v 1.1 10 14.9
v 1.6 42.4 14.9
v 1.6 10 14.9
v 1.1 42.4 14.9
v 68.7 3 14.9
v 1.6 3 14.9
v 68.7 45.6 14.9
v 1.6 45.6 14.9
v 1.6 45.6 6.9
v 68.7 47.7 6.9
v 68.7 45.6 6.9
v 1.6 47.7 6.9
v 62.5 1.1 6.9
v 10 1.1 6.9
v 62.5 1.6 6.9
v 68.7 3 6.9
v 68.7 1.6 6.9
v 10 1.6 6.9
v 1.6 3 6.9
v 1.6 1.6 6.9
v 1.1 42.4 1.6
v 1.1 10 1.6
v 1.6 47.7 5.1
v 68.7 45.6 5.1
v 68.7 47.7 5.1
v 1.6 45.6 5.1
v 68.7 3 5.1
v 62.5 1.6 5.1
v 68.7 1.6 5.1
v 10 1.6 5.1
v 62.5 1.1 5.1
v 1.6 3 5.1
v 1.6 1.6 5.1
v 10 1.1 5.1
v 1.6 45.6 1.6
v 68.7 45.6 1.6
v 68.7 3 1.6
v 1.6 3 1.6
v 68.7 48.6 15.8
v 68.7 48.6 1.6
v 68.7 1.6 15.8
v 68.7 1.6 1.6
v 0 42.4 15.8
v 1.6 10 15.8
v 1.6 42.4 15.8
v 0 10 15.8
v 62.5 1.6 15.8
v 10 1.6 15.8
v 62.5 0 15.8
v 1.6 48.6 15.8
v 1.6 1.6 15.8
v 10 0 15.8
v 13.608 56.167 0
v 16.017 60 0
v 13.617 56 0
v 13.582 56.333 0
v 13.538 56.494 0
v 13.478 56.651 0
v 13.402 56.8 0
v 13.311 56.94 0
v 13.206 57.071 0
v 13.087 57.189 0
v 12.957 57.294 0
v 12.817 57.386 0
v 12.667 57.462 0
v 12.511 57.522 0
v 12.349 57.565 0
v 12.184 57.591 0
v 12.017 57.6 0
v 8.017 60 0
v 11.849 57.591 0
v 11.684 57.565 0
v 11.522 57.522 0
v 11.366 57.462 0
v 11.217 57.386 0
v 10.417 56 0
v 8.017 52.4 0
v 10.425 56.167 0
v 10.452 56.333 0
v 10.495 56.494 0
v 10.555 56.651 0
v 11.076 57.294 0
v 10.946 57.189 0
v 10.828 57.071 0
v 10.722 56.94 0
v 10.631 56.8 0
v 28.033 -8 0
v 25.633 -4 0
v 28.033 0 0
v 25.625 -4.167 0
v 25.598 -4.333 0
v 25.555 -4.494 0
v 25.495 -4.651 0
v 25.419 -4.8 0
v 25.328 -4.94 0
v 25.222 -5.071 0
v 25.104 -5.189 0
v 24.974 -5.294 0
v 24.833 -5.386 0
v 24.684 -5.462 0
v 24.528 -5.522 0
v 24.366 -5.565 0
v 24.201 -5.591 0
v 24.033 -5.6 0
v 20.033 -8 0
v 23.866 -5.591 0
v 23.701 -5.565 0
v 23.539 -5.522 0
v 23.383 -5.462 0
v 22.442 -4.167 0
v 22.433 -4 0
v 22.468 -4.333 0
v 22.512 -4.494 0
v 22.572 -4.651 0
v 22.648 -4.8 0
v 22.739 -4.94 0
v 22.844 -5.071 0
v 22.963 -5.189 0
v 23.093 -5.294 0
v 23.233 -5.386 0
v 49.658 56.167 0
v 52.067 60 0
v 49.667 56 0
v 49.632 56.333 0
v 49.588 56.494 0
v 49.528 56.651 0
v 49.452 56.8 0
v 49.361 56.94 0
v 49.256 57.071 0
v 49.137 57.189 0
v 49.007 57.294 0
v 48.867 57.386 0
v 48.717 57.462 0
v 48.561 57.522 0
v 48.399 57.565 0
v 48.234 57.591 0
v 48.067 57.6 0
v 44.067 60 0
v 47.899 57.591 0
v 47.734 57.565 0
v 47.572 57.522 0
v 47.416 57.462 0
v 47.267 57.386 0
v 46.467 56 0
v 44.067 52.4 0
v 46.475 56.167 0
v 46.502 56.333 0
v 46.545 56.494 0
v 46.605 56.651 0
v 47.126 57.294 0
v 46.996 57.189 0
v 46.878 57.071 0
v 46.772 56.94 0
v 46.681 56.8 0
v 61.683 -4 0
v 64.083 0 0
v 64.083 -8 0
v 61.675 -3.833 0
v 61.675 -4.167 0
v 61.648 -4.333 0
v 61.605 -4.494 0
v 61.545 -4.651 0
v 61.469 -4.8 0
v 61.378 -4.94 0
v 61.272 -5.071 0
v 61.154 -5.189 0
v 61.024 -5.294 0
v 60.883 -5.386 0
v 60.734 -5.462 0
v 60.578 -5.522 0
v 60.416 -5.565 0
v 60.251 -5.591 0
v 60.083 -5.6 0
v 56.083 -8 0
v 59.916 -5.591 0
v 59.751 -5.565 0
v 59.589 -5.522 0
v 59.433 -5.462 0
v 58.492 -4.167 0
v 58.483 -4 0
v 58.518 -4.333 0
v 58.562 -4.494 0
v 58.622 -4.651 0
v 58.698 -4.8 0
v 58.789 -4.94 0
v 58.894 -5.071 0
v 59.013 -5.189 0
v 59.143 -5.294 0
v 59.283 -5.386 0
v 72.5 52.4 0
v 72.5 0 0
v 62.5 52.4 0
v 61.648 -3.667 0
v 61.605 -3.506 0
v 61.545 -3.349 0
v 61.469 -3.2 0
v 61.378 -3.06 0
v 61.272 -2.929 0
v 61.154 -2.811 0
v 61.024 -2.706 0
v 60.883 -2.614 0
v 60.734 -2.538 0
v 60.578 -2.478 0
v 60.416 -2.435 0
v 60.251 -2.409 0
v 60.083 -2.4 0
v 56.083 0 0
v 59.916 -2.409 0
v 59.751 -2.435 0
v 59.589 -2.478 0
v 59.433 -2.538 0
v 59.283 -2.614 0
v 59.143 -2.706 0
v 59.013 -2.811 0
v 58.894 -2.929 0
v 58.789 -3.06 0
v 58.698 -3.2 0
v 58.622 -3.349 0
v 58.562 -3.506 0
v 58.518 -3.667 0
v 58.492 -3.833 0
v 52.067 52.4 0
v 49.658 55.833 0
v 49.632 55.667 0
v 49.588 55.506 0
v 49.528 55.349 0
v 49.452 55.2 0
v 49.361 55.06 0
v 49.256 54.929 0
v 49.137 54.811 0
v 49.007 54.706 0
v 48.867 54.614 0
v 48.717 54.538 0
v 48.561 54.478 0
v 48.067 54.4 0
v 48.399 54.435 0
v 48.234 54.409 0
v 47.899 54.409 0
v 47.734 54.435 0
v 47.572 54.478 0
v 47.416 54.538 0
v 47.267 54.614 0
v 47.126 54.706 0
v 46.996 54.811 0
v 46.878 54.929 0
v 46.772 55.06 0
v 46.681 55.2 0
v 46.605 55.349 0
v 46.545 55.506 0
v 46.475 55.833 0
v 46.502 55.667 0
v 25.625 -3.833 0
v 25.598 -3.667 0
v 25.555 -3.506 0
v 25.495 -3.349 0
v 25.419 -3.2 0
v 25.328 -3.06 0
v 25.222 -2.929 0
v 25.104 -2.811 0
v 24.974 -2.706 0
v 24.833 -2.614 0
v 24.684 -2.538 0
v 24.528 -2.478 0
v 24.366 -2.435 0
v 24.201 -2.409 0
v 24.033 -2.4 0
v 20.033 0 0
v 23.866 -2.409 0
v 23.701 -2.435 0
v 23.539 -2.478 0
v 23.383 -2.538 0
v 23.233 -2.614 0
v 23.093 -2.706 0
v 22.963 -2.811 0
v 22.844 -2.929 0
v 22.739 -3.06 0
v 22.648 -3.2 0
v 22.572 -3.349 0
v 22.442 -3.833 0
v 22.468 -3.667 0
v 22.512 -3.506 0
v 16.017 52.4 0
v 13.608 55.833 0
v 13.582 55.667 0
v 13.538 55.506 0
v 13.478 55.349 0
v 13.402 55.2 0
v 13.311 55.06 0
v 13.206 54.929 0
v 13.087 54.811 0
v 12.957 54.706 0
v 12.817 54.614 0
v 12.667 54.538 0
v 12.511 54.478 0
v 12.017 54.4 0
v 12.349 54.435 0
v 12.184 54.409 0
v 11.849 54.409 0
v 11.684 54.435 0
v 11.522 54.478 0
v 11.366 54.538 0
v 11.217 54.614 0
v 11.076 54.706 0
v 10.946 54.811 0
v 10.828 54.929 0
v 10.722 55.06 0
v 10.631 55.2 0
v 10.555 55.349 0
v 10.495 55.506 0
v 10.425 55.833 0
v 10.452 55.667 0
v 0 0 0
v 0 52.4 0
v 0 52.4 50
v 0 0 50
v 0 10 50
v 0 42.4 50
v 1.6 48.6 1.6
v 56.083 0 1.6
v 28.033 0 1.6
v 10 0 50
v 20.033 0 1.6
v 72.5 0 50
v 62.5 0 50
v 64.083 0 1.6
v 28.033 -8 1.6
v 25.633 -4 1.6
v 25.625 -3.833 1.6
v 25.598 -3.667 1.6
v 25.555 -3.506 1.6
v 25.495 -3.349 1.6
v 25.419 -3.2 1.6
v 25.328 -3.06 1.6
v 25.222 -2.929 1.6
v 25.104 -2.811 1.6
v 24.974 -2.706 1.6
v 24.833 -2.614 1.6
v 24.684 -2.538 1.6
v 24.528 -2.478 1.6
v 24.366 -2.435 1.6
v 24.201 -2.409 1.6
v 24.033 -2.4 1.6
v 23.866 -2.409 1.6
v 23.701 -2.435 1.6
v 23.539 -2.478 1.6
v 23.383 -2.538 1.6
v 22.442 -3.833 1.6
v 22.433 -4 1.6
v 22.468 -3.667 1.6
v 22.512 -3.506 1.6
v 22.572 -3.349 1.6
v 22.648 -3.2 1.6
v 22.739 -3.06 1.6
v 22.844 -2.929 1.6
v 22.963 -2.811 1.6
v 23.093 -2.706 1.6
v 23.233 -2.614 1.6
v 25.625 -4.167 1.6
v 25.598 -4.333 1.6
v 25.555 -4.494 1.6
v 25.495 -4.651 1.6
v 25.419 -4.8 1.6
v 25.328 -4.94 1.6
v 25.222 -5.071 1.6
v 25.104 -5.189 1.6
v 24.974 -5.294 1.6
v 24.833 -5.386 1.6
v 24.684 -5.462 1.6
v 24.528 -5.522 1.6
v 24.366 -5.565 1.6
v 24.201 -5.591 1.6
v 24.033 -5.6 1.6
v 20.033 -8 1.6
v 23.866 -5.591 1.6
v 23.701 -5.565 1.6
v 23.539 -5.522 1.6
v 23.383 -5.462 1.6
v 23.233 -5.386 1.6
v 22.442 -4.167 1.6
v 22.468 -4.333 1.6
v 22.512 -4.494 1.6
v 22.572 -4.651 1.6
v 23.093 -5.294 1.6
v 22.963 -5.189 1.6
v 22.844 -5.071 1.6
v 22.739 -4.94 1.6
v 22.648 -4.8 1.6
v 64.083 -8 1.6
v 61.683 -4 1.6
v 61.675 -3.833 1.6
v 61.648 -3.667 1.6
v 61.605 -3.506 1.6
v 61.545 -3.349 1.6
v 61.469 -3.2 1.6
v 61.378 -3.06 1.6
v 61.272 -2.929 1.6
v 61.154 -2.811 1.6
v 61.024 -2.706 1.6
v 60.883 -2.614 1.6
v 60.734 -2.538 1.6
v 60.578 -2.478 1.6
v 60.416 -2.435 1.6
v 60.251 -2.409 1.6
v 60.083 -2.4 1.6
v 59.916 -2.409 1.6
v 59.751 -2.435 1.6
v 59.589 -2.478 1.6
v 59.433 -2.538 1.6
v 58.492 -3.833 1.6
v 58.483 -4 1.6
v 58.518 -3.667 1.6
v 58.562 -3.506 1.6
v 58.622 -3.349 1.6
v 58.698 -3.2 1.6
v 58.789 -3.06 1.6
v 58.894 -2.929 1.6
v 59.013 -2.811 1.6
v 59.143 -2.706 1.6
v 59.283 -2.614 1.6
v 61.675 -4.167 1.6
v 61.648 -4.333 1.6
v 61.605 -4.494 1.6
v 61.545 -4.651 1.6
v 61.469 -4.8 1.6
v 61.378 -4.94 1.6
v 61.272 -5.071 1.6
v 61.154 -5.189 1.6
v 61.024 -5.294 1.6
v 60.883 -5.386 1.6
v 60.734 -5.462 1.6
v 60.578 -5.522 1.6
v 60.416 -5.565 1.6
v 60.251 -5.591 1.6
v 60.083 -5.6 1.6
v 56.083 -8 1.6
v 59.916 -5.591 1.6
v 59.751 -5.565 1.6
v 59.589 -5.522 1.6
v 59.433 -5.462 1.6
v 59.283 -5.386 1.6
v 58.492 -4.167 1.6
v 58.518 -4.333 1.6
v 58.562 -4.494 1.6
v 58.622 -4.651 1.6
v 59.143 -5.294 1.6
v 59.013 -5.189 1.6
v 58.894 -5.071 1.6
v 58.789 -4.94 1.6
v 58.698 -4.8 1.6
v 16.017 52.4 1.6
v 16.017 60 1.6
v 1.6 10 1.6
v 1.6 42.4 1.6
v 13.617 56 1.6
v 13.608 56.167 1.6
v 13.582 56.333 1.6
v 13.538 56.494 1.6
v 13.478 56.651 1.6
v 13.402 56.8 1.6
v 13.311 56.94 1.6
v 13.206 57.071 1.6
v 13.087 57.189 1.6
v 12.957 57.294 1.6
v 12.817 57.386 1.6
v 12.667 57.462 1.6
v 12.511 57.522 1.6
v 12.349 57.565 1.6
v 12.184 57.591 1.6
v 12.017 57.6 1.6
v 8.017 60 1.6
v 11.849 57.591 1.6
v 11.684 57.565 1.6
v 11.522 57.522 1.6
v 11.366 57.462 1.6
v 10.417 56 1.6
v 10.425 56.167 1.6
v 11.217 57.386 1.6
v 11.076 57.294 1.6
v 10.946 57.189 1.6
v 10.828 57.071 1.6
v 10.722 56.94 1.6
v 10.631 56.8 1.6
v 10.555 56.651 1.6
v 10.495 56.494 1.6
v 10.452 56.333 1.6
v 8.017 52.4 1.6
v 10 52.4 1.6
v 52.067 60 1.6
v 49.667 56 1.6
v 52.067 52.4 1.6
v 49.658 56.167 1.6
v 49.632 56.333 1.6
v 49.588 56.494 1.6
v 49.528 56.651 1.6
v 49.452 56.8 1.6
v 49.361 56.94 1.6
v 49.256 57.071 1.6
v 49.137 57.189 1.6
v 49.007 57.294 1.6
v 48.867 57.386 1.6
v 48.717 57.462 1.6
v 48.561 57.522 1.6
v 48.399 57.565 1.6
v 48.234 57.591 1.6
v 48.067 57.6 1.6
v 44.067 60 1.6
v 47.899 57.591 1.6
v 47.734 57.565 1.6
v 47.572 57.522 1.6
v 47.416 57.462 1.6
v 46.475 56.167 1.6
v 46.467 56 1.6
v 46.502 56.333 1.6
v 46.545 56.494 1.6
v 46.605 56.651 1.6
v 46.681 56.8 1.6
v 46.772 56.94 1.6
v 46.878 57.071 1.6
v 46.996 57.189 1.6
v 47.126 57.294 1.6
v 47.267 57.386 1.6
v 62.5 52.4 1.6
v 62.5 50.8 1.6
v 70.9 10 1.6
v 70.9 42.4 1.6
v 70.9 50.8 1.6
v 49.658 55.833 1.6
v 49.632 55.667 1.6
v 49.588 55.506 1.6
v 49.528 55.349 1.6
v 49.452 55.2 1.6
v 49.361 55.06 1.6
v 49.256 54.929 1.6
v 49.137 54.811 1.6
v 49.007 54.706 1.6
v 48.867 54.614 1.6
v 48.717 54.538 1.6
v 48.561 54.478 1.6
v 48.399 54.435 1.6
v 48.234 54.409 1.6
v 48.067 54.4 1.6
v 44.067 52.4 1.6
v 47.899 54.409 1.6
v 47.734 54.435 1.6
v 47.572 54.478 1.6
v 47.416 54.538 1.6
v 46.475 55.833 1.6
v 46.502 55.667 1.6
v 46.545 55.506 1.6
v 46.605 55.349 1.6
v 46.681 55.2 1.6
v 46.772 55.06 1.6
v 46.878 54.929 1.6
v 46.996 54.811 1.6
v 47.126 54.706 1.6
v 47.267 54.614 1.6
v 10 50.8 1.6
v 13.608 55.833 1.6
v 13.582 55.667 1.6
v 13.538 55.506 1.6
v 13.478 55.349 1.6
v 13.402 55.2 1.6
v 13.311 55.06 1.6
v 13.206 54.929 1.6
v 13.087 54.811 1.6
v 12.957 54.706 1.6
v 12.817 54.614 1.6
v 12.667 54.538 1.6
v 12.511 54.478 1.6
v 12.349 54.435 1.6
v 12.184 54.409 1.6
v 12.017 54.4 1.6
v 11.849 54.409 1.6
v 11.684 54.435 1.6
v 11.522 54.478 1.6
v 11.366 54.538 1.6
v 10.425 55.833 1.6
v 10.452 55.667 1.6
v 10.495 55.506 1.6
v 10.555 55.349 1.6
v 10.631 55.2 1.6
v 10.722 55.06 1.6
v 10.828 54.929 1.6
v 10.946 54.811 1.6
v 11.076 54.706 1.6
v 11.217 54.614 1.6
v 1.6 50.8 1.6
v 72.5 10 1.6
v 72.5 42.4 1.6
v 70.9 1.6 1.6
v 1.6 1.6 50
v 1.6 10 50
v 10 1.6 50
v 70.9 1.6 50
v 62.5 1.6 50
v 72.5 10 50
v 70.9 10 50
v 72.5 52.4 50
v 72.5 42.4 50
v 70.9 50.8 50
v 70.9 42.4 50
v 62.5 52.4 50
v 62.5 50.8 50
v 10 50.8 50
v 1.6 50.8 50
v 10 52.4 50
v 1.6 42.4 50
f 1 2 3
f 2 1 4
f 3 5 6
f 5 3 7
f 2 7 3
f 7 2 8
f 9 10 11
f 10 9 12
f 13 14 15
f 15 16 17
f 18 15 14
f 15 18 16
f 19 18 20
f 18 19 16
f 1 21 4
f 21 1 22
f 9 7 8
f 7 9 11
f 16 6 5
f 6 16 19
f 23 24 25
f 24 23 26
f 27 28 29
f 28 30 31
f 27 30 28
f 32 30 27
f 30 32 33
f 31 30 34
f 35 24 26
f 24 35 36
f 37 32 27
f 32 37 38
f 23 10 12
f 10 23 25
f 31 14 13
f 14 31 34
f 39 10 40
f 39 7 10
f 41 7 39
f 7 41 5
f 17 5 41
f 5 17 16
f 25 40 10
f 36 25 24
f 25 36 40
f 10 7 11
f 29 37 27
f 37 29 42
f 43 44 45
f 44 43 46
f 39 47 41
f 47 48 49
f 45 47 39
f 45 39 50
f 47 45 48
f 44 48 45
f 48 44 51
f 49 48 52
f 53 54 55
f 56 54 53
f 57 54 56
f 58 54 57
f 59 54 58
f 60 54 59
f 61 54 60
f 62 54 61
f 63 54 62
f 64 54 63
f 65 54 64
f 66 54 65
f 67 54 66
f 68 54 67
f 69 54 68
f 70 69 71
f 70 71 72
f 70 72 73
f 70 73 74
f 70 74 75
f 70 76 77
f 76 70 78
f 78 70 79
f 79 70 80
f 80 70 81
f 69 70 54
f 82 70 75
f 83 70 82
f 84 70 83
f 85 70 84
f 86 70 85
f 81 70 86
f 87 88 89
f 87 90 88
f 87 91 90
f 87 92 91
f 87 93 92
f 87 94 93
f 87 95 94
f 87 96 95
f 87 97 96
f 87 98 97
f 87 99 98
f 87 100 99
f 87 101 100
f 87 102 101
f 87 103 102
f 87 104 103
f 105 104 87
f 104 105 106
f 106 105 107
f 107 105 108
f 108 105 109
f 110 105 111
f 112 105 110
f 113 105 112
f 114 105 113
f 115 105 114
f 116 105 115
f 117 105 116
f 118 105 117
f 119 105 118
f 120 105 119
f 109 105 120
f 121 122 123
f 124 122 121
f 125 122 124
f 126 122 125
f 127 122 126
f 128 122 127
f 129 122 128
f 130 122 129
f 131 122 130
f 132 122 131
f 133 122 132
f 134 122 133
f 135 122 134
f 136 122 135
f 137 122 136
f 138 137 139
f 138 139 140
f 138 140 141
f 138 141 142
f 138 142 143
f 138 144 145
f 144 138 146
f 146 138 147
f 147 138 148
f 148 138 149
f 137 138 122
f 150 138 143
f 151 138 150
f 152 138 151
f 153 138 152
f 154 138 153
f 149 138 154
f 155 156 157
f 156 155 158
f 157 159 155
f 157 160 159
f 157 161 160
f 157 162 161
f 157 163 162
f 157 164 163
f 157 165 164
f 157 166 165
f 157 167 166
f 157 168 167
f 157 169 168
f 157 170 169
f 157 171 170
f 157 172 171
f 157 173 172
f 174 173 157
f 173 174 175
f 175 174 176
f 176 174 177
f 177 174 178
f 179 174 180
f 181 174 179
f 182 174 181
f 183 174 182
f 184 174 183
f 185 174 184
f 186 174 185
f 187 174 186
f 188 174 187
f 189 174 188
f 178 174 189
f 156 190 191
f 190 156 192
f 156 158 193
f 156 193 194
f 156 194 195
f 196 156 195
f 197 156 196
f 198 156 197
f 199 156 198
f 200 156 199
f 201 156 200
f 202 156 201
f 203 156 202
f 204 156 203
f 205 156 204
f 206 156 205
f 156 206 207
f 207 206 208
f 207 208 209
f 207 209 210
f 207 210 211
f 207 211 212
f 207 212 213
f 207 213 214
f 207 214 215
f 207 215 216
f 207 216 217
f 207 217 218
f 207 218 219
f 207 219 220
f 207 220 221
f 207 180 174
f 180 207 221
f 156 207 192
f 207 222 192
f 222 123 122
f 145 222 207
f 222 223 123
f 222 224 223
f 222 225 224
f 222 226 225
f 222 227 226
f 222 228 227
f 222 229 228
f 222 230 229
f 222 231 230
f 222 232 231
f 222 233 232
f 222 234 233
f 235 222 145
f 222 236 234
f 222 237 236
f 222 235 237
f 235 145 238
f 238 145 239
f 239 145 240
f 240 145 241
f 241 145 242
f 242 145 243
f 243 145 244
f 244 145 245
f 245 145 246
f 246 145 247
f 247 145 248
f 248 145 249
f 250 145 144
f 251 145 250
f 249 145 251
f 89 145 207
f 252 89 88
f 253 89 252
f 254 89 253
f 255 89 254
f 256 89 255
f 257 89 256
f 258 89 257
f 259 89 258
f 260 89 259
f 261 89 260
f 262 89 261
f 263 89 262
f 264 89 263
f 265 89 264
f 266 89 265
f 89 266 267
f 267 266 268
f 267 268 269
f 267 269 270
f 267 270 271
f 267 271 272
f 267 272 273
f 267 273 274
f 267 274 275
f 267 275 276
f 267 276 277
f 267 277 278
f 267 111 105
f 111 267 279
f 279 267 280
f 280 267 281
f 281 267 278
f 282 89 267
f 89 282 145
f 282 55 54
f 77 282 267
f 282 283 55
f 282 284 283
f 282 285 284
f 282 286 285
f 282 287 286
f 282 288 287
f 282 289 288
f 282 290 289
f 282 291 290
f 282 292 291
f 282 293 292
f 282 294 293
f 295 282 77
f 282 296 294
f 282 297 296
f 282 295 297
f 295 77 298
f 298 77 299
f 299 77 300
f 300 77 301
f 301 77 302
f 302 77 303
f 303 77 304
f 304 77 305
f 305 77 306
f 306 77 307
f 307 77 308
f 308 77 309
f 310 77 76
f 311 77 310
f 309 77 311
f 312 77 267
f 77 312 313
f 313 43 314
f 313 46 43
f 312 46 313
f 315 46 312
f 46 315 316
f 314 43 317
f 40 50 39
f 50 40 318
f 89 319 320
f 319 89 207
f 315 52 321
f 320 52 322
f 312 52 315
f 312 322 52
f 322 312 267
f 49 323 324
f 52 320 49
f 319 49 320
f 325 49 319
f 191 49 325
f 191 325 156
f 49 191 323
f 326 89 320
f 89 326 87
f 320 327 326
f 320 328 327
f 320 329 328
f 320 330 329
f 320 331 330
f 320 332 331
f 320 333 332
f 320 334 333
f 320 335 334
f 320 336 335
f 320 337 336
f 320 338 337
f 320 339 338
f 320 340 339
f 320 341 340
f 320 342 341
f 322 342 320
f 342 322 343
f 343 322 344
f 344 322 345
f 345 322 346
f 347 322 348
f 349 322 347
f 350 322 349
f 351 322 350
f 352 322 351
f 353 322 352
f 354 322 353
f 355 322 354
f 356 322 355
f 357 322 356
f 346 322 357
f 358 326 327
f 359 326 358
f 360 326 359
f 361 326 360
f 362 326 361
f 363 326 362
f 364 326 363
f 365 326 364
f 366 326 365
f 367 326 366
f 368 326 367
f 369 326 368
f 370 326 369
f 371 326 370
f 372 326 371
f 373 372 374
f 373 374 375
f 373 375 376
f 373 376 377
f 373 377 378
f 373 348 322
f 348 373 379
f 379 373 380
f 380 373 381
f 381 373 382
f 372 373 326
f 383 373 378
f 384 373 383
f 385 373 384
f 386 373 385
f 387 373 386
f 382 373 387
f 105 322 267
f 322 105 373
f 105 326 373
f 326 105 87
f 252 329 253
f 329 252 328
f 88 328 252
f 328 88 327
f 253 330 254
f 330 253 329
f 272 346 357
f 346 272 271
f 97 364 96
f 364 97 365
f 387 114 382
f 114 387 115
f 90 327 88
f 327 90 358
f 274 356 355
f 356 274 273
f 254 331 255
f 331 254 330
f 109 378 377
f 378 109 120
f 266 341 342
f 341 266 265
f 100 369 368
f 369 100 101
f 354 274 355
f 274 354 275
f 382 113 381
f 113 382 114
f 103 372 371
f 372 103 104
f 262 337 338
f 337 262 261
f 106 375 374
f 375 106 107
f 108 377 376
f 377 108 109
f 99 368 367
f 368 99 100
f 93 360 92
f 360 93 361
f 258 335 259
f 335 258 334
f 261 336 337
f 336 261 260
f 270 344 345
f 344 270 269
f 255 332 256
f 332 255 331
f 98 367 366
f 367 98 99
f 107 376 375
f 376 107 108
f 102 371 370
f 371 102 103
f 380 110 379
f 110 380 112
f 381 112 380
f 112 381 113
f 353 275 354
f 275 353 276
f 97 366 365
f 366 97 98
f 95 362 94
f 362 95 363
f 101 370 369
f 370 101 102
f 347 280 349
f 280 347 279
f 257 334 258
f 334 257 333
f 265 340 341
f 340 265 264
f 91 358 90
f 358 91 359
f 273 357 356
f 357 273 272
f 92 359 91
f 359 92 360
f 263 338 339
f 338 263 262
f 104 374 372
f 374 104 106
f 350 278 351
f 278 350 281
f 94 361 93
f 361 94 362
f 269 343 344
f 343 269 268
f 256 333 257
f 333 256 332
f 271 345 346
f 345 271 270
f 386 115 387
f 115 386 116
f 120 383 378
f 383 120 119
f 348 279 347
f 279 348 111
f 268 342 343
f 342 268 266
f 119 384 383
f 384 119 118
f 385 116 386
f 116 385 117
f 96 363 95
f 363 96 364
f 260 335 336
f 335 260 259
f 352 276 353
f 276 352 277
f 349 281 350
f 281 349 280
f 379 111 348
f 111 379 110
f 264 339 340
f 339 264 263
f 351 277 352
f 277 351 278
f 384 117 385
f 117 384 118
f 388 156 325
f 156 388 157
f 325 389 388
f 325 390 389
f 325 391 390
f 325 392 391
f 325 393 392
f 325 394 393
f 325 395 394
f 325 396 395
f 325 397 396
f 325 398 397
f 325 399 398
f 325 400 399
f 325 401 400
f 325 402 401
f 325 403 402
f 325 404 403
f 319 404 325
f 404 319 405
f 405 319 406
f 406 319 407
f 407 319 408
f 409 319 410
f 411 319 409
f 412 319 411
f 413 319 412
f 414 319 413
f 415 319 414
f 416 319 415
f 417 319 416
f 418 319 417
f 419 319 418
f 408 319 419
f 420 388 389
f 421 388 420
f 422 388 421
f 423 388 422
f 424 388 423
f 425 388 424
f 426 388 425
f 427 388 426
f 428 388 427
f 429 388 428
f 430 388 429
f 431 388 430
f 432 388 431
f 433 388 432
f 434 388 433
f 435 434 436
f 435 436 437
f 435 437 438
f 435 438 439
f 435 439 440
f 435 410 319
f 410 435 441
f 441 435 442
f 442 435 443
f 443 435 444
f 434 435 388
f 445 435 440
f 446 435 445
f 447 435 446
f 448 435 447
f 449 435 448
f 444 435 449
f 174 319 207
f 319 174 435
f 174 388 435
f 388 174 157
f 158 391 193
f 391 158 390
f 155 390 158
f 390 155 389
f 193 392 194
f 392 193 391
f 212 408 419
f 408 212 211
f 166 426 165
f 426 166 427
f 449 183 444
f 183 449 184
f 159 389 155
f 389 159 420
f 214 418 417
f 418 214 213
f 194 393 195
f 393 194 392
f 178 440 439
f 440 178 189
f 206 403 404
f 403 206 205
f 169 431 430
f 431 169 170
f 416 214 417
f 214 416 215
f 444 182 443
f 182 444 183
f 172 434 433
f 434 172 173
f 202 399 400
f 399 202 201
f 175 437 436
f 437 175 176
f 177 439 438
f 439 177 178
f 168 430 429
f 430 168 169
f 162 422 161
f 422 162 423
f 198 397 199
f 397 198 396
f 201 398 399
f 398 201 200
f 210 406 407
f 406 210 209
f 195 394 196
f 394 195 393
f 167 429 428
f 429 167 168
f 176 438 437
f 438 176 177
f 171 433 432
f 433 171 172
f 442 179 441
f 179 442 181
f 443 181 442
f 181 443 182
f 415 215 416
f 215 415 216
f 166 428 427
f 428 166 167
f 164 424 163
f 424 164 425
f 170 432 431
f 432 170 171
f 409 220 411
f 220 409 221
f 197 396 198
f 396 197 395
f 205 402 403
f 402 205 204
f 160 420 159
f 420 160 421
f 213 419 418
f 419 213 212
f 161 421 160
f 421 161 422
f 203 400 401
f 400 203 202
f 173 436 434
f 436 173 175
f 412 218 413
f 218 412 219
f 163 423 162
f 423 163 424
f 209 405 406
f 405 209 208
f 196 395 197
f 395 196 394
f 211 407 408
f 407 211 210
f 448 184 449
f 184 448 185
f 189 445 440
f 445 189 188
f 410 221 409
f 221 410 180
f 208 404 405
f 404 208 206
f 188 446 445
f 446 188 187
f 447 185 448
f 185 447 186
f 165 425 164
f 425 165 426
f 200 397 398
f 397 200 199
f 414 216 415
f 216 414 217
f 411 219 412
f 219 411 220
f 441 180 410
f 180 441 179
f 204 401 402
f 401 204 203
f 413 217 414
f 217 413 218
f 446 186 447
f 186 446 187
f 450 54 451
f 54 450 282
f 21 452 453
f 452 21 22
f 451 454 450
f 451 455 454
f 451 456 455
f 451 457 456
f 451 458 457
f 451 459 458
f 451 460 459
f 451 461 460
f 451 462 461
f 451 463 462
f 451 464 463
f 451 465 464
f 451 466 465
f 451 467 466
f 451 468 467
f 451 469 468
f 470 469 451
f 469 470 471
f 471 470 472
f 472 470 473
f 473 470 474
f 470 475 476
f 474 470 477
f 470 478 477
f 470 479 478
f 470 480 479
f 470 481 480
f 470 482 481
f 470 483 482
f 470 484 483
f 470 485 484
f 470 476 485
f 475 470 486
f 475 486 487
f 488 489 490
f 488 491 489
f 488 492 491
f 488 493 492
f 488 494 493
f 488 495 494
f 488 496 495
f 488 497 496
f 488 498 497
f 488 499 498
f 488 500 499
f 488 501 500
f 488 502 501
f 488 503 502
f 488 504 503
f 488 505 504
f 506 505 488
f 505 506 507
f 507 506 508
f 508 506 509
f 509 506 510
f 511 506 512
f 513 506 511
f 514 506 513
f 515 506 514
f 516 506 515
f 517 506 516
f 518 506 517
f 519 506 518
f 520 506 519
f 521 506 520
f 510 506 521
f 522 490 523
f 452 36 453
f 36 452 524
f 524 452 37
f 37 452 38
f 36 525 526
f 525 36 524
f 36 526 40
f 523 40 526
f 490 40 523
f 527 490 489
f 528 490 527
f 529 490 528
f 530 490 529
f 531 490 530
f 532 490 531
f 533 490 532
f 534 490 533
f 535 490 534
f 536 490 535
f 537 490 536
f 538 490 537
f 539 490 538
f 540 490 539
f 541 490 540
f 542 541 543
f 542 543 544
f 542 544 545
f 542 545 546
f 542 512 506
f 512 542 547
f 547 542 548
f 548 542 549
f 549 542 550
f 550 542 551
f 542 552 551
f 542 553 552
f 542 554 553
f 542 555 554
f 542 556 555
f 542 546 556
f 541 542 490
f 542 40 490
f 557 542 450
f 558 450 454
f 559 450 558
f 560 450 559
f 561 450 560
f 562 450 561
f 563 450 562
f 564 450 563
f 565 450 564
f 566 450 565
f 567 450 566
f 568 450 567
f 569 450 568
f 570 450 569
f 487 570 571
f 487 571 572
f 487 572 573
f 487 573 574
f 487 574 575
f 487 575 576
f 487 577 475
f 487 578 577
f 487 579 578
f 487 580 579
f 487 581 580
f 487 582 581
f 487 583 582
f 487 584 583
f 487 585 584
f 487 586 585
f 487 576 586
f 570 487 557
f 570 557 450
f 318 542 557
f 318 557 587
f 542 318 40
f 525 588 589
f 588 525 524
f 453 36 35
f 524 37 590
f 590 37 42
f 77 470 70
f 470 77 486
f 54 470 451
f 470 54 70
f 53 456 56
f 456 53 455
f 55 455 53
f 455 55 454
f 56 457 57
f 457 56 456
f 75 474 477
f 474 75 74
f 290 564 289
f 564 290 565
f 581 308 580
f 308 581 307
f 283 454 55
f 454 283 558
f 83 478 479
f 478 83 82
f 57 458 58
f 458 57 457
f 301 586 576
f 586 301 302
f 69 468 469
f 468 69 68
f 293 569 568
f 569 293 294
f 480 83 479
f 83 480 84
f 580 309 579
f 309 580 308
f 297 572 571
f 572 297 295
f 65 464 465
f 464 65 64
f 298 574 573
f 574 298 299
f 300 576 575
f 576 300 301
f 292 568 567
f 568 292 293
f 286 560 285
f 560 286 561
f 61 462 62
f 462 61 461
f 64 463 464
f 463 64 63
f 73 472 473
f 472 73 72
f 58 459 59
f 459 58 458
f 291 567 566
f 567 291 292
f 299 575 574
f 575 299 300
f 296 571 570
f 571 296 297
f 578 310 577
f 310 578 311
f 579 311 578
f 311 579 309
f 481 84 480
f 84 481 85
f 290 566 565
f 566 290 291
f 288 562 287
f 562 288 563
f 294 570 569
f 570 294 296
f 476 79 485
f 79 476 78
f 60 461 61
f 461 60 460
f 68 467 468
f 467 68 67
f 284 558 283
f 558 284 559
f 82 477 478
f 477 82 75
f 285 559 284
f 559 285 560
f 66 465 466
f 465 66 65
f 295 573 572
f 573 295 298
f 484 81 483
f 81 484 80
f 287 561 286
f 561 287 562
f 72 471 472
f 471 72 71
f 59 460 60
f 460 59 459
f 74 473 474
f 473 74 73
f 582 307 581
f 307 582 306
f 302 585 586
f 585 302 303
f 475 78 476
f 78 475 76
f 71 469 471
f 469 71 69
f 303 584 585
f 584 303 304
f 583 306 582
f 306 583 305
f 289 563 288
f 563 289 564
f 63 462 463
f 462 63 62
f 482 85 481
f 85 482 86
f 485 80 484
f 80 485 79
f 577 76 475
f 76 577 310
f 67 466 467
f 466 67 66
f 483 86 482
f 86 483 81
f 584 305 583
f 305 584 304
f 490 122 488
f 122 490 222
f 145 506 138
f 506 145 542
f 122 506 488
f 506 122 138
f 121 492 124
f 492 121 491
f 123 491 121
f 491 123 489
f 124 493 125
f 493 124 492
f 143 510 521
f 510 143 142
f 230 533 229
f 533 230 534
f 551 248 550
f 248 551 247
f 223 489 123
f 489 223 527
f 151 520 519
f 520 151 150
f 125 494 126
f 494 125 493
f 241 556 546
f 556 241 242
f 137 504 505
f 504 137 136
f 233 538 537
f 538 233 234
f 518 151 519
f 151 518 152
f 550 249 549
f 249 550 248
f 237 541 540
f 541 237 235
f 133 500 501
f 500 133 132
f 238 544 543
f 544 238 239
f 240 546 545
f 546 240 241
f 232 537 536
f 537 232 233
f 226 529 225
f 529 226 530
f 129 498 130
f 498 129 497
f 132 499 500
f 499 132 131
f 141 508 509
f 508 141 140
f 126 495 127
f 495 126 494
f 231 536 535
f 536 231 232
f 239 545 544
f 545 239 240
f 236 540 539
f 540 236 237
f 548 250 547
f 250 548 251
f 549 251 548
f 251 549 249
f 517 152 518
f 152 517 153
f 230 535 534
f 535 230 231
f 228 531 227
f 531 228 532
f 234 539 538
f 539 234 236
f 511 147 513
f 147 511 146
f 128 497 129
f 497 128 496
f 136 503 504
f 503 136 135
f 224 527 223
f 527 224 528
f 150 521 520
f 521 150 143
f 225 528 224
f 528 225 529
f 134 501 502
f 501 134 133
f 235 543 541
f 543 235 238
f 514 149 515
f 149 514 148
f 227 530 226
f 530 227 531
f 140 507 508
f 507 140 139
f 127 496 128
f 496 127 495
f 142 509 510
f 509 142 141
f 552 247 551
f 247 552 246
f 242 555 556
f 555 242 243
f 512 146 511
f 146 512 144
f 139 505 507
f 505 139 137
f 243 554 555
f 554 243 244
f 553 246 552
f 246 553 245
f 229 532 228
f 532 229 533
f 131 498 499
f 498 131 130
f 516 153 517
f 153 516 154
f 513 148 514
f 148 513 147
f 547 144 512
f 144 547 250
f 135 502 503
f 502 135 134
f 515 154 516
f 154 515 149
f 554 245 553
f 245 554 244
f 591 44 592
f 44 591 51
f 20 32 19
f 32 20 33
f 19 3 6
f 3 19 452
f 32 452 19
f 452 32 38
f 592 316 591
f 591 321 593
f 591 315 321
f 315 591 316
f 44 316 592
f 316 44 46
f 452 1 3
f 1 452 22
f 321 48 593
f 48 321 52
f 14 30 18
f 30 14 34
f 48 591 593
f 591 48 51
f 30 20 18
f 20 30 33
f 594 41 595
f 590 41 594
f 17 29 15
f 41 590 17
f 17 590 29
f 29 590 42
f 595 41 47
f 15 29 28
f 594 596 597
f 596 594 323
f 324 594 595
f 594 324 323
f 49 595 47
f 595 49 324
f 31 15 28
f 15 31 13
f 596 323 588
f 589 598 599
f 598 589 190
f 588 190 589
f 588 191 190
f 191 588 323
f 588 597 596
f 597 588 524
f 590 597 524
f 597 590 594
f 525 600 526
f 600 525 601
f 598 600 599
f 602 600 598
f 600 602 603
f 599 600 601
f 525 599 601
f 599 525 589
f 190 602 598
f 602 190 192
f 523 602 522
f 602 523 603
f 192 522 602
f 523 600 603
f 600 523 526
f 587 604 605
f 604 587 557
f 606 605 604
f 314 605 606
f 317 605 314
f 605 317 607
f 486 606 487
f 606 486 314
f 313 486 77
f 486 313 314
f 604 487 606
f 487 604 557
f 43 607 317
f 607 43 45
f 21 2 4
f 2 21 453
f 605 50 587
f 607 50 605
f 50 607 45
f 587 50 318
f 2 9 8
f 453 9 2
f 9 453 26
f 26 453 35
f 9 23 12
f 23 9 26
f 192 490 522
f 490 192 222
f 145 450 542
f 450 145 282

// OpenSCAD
// file: Circuit_plate_holder.scad
$fn = 60;

e_m = 0.1;      //3D-printing error margin

//circuit board
cb_w = 66.5;    //circuit board width
cb_d = 46.4;    //circuit board depth
cb_h = 1.6;     //circuit board height

//circuit board placement
//cb_p_h = 4;   //height
cb_p_s_d = 2;   //sloth depth
cb_b_s = 0;     // back slot yes(1) or no(0)
//circuit board height needs to be changed by the circuit board height

//component opening
cb_p_h_t = 8;   //height top
cb_p_h_b = 4;   //height bottom

//casing
c_t = 1;        //Case thick
c_w = 68.7;//c_t*2+e_m*2+cb_w;       //case width
c_d = 48.6;//c_t*2+e_m*2+cb_d;       //case depth
c_h = c_t*2+e_m*2+cb_h+cb_p_h_b+cb_p_h_t;       //case height
echo(c_w); //68.7
echo(c_d); //48.6
echo(c_h); //22.8
//Case height needs to be changed by the circuit board height

circuit_holder();

module circuit_holder(){
    difference(){
        cube([c_w, c_d, c_h]);
        pcb_no_go_zone();
    }
}

module pcb_no_go_zone(){
    union(){
        union(){
            if ( cb_b_s == 1){
                translate([(c_w-cb_w)+c_t-e_m*2+e_m,c_t+cb_p_s_d,(cb_p_h_b+e_m + c_t)+cb_h+e_m*2])
                cube([(cb_w+e_m*2)-cb_p_s_d + c_t, (cb_d+e_m*2)-cb_p_s_d*2, cb_p_h_t]);
                translate([(c_w-cb_w)+c_t-e_m*2+e_m,c_t+cb_p_s_d,(cb_p_h_b+e_m + c_t) - cb_p_h_b])
                cube([(cb_w+e_m*2)-cb_p_s_d+ c_t, (cb_d+e_m*2)-cb_p_s_d*2, cb_p_h_b]);
            }
            else{
                translate([(c_w-cb_w)-c_t-e_m*2+e_m,c_t+cb_p_s_d,(cb_p_h_b+e_m+c_t)+cb_h+e_m*2])
                cube([(cb_w+e_m*2)+ c_t, (cb_d+e_m*2)-cb_p_s_d*2, cb_p_h_t]);
                translate([(c_w-cb_w)-c_t-e_m*2+e_m,c_t+cb_p_s_d,(cb_p_h_b+e_m+c_t) - cb_p_h_b])
                cube([(cb_w+e_m*2)+ c_t, (cb_d+e_m*2)-cb_p_s_d*2, cb_p_h_b]);
            }
        }
        translate([(c_w-cb_w)-c_t-e_m*2+e_m,c_t+e_m,cb_p_h_b+e_m+c_t])
        cube([cb_w+e_m*2+ c_t, cb_d+e_m*2, cb_h+e_m*2]);
    }
}
// main file
include <Circuit_plate_holder.scad>

//casing holder dimentions
ch_t = 1.6;       //thickness walls
ch_s_w = 10;     // width sides
ch_s_h = 50;      // height sides

//mounting holes
mh_dia = 3.2; //Diameter
mh_w = 8;
mh_d = 8;

translate([1/3*(c_w+ch_t*2+e_m*2)-mh_w/2,-mh_d, 0]) mount_hole();
translate([5/6*(c_w+ch_t*2+e_m*2)-mh_w/2,-mh_d, 0]) mount_hole();


translate([1/6*(c_w+ch_t*2+e_m*2)-mh_w/2,c_d+ch_t*2+e_m*2, 0]) mount_hole();
translate([2/3*(c_w+ch_t*2+e_m*2)-mh_w/2,c_d+ch_t*2+e_m*2, 0]) mount_hole();

union(){
    //base
    cube([c_w+ch_t*2+e_m*6, c_d+ch_t*2+e_m*6, ch_t]);
    //sides
    side();
    translate([c_w+ch_t*2+e_m*6, 0, 0])rotate([0,0,90])side();
    translate([c_w+ch_t*2+e_m*6, c_d+ch_t*2+e_m*6, 0])rotate([0,0,180])side();
    translate([0, c_d+ch_t*2+e_m*6, 0])rotate([0,0,270])side();
}
//color("green")translate([ch_t,ch_t,ch_t])circuit_holder();

module side(){
    union(){
        cube([ch_t, ch_s_w, ch_s_h]);
        cube([ch_s_w, ch_t , ch_s_h]);
    }
}

module mount_hole(){
    difference(){
        cube([mh_w, mh_d, ch_t]);
        translate([mh_w/2, mh_d/2])cylinder(h=ch_s_h, d=mh_dia);
    }
}
